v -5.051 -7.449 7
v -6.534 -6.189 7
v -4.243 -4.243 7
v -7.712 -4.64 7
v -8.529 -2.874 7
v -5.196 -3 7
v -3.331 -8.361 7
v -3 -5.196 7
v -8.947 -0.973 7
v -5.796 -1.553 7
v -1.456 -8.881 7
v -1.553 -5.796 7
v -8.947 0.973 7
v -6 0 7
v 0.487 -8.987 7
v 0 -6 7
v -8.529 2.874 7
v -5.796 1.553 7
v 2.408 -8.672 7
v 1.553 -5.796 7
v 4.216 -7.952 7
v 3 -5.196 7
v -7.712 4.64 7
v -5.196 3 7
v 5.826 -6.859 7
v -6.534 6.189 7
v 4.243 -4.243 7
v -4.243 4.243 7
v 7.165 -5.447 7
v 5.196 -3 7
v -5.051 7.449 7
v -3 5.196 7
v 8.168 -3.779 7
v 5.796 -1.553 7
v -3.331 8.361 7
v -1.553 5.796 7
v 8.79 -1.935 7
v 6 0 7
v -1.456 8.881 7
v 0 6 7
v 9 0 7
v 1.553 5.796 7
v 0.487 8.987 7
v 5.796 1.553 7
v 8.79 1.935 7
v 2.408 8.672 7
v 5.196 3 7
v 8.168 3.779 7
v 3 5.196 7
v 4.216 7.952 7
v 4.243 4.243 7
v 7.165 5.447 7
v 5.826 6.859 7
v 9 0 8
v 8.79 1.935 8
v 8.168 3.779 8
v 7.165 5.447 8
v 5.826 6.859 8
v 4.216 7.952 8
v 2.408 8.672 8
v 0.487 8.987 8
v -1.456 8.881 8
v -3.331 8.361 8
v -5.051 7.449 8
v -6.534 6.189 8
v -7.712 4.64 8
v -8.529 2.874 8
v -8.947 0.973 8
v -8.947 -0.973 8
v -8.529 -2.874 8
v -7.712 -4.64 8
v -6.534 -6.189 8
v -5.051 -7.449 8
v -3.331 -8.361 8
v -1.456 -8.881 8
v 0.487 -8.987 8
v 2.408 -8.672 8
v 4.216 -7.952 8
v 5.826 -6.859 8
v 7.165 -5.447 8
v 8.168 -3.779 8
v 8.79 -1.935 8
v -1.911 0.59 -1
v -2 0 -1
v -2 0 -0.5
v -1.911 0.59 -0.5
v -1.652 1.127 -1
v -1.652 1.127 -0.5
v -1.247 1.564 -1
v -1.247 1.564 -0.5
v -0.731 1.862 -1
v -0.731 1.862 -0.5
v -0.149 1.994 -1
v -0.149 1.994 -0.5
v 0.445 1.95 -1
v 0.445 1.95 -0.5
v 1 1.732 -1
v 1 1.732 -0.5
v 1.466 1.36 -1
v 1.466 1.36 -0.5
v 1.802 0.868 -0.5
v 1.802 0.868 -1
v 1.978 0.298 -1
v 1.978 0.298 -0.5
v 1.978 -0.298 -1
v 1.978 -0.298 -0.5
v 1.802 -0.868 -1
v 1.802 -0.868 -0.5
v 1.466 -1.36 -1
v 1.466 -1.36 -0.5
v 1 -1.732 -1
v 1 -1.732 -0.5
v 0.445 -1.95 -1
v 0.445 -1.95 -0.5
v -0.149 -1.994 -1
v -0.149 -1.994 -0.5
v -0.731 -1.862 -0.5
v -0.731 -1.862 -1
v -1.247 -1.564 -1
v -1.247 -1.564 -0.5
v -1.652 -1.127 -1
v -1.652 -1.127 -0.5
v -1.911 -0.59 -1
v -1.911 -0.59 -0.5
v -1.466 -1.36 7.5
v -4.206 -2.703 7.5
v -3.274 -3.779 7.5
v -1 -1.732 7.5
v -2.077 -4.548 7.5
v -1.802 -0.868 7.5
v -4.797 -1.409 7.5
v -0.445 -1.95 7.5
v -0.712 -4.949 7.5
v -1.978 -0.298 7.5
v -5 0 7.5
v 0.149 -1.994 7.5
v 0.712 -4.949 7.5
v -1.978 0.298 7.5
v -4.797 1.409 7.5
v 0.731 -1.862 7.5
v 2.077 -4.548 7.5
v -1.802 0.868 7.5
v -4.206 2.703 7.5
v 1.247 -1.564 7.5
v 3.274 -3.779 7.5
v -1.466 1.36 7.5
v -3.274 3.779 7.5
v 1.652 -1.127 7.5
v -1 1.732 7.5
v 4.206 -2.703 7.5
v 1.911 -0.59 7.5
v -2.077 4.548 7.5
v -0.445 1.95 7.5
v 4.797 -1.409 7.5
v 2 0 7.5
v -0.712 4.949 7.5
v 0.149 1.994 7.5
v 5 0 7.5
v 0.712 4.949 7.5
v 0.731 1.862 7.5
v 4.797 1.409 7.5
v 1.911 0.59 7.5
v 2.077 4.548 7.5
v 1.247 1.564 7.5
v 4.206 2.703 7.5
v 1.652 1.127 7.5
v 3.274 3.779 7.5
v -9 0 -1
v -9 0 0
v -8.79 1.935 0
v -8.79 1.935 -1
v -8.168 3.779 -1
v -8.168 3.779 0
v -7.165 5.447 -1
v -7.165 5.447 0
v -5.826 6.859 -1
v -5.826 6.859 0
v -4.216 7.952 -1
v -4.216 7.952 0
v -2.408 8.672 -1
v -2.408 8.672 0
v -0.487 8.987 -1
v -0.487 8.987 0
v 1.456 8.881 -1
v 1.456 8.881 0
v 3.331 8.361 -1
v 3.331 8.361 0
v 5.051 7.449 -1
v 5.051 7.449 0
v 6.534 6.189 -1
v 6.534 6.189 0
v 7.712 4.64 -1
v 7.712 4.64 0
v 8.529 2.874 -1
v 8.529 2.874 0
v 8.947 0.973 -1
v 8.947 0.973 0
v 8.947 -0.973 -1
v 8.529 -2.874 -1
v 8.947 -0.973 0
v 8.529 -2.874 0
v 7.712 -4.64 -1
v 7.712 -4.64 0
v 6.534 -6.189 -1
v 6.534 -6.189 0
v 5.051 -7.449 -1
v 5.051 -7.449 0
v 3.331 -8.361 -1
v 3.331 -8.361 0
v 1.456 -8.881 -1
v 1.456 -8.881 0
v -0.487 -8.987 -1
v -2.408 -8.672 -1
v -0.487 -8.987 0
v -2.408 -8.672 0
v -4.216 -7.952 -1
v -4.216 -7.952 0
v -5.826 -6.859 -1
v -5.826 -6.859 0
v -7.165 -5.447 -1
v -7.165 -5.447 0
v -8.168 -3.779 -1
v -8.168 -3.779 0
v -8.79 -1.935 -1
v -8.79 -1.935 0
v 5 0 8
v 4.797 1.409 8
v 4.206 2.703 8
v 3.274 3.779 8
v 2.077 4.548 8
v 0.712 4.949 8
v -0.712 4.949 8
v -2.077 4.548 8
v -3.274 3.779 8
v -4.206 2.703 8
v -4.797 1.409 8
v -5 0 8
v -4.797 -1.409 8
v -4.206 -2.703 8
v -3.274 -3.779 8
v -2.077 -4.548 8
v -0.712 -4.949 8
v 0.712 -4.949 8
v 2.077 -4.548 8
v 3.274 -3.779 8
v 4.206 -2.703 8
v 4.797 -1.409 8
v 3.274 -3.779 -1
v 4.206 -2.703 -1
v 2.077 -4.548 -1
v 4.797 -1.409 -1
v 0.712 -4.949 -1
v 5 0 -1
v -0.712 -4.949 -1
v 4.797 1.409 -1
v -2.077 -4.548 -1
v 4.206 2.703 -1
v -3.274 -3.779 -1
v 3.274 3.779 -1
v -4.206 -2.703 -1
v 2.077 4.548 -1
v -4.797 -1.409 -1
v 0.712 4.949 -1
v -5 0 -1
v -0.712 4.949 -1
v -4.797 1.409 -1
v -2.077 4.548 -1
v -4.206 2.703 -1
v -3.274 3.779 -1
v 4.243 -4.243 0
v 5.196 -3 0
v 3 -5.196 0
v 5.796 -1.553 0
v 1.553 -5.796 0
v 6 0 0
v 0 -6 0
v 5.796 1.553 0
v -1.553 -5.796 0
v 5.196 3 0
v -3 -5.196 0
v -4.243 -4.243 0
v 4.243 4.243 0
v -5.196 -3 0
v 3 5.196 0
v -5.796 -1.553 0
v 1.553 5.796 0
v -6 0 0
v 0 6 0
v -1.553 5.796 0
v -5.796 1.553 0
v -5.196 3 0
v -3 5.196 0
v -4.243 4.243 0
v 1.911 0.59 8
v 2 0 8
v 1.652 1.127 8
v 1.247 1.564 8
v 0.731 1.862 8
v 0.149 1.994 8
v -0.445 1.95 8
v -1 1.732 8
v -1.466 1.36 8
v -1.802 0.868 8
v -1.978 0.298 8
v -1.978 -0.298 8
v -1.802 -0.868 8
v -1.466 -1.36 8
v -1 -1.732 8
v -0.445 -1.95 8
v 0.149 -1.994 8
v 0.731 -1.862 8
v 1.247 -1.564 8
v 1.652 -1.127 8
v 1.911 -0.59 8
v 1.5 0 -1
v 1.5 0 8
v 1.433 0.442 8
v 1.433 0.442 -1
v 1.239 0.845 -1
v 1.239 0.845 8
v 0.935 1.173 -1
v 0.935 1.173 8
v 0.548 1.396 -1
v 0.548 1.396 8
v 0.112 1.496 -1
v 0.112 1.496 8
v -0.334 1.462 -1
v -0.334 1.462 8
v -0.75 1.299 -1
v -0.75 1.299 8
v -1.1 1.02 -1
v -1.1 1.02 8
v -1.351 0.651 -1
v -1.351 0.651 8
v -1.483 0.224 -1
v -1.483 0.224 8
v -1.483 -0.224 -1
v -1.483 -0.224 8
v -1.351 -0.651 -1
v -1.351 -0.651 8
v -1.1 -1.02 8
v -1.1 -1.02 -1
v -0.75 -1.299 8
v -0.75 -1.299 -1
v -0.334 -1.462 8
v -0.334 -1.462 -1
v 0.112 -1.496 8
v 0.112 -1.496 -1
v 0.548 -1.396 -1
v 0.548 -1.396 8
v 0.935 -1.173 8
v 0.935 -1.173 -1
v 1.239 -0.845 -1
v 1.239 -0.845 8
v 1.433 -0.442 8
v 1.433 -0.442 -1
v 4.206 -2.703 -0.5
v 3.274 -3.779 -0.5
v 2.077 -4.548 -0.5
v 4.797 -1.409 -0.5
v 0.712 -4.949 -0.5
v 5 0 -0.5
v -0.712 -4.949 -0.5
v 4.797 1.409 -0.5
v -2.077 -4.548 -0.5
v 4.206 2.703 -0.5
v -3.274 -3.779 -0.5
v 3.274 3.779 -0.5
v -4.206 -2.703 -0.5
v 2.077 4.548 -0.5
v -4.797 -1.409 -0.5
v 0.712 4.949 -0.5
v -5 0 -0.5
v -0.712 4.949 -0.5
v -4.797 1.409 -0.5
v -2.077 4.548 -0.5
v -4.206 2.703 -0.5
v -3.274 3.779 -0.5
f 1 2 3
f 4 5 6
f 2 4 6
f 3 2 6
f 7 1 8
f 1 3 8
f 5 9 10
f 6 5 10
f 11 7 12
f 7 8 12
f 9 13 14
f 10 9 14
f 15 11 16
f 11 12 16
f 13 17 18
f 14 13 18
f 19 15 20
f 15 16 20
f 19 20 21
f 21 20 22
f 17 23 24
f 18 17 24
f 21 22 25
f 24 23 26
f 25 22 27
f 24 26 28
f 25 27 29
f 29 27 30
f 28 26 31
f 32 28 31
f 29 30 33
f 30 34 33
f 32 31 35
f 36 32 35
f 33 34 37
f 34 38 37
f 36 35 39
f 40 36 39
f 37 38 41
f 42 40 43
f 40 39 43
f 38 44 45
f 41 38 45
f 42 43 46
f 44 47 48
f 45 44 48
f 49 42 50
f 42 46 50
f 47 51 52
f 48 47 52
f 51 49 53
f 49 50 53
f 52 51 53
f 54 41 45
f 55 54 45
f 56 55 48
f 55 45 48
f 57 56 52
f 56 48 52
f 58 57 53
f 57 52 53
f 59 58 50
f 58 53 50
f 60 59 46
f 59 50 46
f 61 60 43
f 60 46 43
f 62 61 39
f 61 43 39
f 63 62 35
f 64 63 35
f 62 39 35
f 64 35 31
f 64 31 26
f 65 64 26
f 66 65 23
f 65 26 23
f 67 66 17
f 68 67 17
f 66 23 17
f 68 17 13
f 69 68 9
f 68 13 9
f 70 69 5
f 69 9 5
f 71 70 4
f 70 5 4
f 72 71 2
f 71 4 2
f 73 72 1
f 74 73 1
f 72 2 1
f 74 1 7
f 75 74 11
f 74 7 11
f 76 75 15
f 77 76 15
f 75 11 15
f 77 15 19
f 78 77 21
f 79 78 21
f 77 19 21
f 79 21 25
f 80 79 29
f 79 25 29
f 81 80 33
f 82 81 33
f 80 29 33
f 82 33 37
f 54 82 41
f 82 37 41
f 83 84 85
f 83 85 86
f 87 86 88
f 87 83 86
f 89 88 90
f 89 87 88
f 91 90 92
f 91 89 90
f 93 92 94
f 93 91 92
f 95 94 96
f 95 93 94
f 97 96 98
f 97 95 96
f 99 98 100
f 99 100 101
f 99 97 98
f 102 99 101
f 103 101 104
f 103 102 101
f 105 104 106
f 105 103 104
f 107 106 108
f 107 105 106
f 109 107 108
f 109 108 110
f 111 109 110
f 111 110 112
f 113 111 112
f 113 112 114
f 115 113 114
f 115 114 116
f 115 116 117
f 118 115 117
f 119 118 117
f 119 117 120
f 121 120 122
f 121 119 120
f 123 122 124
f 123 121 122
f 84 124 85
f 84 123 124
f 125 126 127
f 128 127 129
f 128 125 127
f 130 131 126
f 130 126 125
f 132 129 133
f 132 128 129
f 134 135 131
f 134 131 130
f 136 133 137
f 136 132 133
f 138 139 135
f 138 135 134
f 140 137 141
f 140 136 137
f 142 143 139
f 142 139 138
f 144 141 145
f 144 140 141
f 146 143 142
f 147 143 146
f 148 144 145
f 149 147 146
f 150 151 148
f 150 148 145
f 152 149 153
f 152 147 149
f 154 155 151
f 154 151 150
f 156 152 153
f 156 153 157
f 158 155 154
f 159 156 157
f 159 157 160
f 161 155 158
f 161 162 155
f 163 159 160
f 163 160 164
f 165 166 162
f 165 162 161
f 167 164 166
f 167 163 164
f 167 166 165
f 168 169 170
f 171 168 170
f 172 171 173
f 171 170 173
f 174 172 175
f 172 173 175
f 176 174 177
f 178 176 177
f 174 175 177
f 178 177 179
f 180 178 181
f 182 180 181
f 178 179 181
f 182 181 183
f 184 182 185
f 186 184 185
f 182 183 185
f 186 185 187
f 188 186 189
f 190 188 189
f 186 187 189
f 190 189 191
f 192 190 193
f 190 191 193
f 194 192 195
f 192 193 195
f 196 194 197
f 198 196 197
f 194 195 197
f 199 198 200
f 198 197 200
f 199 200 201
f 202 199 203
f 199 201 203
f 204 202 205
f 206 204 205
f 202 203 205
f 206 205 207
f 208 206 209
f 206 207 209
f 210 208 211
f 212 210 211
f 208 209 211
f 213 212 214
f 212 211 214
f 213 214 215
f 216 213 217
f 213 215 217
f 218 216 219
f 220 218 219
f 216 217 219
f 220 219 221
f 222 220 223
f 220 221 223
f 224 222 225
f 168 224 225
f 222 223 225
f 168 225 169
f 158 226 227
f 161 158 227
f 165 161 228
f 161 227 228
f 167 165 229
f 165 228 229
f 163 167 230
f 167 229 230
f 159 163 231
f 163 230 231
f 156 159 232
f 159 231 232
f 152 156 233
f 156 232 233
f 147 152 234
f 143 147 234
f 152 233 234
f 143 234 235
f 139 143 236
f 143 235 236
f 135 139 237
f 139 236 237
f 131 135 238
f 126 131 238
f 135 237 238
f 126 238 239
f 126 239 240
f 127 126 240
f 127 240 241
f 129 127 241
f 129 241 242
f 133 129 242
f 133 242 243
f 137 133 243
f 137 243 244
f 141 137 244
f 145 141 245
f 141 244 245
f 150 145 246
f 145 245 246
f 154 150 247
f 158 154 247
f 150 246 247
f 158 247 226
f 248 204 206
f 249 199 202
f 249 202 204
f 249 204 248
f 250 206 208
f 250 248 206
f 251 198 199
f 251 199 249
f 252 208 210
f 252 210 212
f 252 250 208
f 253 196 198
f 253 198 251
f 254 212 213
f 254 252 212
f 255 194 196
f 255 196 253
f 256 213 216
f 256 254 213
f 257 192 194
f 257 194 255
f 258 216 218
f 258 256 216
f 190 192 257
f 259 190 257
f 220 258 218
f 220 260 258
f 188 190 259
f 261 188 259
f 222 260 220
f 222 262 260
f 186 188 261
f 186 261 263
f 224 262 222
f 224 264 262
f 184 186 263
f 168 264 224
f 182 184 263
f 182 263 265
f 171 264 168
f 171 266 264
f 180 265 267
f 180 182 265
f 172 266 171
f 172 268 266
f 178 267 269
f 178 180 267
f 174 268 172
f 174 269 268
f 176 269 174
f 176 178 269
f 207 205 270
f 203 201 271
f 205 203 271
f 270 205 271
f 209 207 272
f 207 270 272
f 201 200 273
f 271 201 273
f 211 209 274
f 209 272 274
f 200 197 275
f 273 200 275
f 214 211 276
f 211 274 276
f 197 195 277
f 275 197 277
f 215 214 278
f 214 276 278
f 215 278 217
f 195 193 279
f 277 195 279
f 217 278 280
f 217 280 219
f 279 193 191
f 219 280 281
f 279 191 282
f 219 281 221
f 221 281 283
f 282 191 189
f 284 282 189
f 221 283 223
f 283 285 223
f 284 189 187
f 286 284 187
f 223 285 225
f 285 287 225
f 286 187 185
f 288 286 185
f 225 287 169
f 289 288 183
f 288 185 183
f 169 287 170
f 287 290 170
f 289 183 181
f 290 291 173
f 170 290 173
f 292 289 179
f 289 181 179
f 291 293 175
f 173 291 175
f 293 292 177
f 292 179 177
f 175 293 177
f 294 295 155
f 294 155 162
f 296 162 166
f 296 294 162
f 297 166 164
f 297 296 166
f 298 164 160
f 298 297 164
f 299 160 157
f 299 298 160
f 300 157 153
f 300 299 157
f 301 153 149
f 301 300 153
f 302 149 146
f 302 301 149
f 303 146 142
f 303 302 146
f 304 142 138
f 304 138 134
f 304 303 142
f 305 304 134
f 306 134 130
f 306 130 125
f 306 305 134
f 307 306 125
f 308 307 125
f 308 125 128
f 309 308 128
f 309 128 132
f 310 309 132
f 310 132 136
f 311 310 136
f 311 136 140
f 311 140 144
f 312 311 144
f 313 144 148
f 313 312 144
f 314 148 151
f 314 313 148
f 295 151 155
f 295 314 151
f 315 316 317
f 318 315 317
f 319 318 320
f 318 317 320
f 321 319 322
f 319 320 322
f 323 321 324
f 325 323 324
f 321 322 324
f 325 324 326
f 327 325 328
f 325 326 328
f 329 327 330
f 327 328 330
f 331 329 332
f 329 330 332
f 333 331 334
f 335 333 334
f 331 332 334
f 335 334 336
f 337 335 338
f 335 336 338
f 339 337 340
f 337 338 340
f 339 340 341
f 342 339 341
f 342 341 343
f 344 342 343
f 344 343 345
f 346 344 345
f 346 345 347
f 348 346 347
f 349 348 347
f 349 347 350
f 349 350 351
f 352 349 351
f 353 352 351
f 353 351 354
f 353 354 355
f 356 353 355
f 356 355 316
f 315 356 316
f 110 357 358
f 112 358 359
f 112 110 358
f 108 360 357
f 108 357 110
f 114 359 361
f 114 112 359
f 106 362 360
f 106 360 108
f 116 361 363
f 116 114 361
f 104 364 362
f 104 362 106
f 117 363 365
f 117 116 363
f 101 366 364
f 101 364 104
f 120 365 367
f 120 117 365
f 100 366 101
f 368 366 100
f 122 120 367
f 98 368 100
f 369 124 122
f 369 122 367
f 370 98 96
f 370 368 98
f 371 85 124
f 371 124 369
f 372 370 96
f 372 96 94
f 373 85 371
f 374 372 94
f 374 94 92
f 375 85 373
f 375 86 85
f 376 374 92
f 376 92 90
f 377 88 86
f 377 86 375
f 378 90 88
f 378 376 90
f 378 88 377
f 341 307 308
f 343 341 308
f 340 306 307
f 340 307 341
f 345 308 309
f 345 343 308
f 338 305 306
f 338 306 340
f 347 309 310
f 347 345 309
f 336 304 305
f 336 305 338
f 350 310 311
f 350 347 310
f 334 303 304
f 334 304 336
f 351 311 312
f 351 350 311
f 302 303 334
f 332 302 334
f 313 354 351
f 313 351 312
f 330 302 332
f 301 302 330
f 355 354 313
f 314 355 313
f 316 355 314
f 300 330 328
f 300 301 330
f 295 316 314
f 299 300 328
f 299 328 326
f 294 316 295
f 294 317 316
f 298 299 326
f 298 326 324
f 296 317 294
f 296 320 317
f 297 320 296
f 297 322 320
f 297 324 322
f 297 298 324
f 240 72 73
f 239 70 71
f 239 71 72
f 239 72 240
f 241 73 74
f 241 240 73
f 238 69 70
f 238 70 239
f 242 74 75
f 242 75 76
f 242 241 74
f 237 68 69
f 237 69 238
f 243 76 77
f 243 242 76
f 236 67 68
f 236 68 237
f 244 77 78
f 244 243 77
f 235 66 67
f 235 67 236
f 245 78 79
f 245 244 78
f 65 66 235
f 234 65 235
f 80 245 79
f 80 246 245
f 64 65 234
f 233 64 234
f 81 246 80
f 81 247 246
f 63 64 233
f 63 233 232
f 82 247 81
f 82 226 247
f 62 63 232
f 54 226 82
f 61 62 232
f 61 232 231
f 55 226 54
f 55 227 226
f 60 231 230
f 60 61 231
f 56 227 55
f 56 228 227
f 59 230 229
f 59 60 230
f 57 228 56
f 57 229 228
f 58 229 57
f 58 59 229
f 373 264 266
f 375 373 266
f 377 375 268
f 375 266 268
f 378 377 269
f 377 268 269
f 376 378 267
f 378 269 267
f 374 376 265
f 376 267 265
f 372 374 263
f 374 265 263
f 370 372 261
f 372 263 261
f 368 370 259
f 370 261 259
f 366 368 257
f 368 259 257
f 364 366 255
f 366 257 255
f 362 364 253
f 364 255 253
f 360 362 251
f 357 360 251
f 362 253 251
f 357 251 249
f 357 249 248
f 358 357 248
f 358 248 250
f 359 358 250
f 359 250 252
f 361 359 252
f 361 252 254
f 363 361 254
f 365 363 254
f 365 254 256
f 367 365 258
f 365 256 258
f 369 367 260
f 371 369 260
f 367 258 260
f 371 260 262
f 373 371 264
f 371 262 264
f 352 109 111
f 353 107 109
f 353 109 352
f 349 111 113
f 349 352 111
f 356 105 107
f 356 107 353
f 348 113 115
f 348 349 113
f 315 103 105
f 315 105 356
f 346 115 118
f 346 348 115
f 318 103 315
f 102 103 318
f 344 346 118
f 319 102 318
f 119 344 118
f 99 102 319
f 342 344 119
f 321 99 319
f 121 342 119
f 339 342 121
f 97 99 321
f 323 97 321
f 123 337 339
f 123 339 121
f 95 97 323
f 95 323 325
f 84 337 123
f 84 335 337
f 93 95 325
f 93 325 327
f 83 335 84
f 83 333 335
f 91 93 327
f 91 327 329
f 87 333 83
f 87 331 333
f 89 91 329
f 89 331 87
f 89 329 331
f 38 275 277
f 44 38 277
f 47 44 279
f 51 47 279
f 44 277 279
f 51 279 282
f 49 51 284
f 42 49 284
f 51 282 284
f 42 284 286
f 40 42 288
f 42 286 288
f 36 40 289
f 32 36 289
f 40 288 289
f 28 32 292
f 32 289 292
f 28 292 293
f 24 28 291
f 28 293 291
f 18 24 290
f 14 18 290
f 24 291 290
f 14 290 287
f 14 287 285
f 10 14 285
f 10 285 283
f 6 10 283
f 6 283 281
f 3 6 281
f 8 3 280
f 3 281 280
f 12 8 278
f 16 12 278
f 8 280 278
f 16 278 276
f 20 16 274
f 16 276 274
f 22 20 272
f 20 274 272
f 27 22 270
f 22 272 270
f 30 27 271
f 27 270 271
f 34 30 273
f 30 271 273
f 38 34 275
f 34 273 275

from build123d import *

# Parameters (mm, degrees)
SKETCH_1_R          = 6
EXTRUDE_1_DEPTH     = 7
SKETCH_2_R          = 9
EXTRUDE_2_DEPTH     = 1
SKETCH_3_R          = 9
EXTRUDE_3_DEPTH     = 1
SKETCH_4_R          = 1.5
CUT_EXTRUDE_2_DEPTH = 11
SKETCH_5_R          = 5
SKETCH_5_R_2        = 2
CUT_EXTRUDE_3_DEPTH = 0.5
SKETCH_6_R          = 5
SKETCH_6_R_2        = 2
CUT_EXTRUDE_4_DEPTH = 0.5


with BuildPart() as part:
    # 草图1 → 凸台-拉伸1 (new body)
    with BuildSketch(Plane.XY):
        Circle(SKETCH_1_R)
    extrude(amount=EXTRUDE_1_DEPTH)

    # 草图2 → 凸台-拉伸2 (add)
    with BuildSketch(Plane.XY.offset(7)):
        Circle(SKETCH_2_R)
    extrude(amount=EXTRUDE_2_DEPTH)

    # 草图3 → 凸台-拉伸3 (add)
    with BuildSketch(Plane(origin=(0, 0, 0), x_dir=(-1, 0, 0), z_dir=(0, 0, -1))):
        Circle(SKETCH_3_R)
    extrude(amount=EXTRUDE_3_DEPTH)

    # 草图4 → 切除-拉伸2 (cut)
    with BuildSketch(Plane.XY.offset(8)):
        Circle(SKETCH_4_R)
    extrude(amount=-CUT_EXTRUDE_2_DEPTH, mode=Mode.SUBTRACT)

    # 草图5 → 切除-拉伸3 (cut)
    with BuildSketch(Plane(origin=(0, 0, -1), x_dir=(-1, 0, 0), z_dir=(0, 0, -1))):
        Circle(SKETCH_5_R)
        Circle(SKETCH_5_R_2, mode=Mode.SUBTRACT)
    extrude(amount=-CUT_EXTRUDE_3_DEPTH, mode=Mode.SUBTRACT)

    # 草图6 → 切除-拉伸4 (cut)
    with BuildSketch(Plane.XY.offset(8)):
        Circle(SKETCH_6_R)
        Circle(SKETCH_6_R_2, mode=Mode.SUBTRACT)
    extrude(amount=-CUT_EXTRUDE_4_DEPTH, mode=Mode.SUBTRACT)


solid = part.part
